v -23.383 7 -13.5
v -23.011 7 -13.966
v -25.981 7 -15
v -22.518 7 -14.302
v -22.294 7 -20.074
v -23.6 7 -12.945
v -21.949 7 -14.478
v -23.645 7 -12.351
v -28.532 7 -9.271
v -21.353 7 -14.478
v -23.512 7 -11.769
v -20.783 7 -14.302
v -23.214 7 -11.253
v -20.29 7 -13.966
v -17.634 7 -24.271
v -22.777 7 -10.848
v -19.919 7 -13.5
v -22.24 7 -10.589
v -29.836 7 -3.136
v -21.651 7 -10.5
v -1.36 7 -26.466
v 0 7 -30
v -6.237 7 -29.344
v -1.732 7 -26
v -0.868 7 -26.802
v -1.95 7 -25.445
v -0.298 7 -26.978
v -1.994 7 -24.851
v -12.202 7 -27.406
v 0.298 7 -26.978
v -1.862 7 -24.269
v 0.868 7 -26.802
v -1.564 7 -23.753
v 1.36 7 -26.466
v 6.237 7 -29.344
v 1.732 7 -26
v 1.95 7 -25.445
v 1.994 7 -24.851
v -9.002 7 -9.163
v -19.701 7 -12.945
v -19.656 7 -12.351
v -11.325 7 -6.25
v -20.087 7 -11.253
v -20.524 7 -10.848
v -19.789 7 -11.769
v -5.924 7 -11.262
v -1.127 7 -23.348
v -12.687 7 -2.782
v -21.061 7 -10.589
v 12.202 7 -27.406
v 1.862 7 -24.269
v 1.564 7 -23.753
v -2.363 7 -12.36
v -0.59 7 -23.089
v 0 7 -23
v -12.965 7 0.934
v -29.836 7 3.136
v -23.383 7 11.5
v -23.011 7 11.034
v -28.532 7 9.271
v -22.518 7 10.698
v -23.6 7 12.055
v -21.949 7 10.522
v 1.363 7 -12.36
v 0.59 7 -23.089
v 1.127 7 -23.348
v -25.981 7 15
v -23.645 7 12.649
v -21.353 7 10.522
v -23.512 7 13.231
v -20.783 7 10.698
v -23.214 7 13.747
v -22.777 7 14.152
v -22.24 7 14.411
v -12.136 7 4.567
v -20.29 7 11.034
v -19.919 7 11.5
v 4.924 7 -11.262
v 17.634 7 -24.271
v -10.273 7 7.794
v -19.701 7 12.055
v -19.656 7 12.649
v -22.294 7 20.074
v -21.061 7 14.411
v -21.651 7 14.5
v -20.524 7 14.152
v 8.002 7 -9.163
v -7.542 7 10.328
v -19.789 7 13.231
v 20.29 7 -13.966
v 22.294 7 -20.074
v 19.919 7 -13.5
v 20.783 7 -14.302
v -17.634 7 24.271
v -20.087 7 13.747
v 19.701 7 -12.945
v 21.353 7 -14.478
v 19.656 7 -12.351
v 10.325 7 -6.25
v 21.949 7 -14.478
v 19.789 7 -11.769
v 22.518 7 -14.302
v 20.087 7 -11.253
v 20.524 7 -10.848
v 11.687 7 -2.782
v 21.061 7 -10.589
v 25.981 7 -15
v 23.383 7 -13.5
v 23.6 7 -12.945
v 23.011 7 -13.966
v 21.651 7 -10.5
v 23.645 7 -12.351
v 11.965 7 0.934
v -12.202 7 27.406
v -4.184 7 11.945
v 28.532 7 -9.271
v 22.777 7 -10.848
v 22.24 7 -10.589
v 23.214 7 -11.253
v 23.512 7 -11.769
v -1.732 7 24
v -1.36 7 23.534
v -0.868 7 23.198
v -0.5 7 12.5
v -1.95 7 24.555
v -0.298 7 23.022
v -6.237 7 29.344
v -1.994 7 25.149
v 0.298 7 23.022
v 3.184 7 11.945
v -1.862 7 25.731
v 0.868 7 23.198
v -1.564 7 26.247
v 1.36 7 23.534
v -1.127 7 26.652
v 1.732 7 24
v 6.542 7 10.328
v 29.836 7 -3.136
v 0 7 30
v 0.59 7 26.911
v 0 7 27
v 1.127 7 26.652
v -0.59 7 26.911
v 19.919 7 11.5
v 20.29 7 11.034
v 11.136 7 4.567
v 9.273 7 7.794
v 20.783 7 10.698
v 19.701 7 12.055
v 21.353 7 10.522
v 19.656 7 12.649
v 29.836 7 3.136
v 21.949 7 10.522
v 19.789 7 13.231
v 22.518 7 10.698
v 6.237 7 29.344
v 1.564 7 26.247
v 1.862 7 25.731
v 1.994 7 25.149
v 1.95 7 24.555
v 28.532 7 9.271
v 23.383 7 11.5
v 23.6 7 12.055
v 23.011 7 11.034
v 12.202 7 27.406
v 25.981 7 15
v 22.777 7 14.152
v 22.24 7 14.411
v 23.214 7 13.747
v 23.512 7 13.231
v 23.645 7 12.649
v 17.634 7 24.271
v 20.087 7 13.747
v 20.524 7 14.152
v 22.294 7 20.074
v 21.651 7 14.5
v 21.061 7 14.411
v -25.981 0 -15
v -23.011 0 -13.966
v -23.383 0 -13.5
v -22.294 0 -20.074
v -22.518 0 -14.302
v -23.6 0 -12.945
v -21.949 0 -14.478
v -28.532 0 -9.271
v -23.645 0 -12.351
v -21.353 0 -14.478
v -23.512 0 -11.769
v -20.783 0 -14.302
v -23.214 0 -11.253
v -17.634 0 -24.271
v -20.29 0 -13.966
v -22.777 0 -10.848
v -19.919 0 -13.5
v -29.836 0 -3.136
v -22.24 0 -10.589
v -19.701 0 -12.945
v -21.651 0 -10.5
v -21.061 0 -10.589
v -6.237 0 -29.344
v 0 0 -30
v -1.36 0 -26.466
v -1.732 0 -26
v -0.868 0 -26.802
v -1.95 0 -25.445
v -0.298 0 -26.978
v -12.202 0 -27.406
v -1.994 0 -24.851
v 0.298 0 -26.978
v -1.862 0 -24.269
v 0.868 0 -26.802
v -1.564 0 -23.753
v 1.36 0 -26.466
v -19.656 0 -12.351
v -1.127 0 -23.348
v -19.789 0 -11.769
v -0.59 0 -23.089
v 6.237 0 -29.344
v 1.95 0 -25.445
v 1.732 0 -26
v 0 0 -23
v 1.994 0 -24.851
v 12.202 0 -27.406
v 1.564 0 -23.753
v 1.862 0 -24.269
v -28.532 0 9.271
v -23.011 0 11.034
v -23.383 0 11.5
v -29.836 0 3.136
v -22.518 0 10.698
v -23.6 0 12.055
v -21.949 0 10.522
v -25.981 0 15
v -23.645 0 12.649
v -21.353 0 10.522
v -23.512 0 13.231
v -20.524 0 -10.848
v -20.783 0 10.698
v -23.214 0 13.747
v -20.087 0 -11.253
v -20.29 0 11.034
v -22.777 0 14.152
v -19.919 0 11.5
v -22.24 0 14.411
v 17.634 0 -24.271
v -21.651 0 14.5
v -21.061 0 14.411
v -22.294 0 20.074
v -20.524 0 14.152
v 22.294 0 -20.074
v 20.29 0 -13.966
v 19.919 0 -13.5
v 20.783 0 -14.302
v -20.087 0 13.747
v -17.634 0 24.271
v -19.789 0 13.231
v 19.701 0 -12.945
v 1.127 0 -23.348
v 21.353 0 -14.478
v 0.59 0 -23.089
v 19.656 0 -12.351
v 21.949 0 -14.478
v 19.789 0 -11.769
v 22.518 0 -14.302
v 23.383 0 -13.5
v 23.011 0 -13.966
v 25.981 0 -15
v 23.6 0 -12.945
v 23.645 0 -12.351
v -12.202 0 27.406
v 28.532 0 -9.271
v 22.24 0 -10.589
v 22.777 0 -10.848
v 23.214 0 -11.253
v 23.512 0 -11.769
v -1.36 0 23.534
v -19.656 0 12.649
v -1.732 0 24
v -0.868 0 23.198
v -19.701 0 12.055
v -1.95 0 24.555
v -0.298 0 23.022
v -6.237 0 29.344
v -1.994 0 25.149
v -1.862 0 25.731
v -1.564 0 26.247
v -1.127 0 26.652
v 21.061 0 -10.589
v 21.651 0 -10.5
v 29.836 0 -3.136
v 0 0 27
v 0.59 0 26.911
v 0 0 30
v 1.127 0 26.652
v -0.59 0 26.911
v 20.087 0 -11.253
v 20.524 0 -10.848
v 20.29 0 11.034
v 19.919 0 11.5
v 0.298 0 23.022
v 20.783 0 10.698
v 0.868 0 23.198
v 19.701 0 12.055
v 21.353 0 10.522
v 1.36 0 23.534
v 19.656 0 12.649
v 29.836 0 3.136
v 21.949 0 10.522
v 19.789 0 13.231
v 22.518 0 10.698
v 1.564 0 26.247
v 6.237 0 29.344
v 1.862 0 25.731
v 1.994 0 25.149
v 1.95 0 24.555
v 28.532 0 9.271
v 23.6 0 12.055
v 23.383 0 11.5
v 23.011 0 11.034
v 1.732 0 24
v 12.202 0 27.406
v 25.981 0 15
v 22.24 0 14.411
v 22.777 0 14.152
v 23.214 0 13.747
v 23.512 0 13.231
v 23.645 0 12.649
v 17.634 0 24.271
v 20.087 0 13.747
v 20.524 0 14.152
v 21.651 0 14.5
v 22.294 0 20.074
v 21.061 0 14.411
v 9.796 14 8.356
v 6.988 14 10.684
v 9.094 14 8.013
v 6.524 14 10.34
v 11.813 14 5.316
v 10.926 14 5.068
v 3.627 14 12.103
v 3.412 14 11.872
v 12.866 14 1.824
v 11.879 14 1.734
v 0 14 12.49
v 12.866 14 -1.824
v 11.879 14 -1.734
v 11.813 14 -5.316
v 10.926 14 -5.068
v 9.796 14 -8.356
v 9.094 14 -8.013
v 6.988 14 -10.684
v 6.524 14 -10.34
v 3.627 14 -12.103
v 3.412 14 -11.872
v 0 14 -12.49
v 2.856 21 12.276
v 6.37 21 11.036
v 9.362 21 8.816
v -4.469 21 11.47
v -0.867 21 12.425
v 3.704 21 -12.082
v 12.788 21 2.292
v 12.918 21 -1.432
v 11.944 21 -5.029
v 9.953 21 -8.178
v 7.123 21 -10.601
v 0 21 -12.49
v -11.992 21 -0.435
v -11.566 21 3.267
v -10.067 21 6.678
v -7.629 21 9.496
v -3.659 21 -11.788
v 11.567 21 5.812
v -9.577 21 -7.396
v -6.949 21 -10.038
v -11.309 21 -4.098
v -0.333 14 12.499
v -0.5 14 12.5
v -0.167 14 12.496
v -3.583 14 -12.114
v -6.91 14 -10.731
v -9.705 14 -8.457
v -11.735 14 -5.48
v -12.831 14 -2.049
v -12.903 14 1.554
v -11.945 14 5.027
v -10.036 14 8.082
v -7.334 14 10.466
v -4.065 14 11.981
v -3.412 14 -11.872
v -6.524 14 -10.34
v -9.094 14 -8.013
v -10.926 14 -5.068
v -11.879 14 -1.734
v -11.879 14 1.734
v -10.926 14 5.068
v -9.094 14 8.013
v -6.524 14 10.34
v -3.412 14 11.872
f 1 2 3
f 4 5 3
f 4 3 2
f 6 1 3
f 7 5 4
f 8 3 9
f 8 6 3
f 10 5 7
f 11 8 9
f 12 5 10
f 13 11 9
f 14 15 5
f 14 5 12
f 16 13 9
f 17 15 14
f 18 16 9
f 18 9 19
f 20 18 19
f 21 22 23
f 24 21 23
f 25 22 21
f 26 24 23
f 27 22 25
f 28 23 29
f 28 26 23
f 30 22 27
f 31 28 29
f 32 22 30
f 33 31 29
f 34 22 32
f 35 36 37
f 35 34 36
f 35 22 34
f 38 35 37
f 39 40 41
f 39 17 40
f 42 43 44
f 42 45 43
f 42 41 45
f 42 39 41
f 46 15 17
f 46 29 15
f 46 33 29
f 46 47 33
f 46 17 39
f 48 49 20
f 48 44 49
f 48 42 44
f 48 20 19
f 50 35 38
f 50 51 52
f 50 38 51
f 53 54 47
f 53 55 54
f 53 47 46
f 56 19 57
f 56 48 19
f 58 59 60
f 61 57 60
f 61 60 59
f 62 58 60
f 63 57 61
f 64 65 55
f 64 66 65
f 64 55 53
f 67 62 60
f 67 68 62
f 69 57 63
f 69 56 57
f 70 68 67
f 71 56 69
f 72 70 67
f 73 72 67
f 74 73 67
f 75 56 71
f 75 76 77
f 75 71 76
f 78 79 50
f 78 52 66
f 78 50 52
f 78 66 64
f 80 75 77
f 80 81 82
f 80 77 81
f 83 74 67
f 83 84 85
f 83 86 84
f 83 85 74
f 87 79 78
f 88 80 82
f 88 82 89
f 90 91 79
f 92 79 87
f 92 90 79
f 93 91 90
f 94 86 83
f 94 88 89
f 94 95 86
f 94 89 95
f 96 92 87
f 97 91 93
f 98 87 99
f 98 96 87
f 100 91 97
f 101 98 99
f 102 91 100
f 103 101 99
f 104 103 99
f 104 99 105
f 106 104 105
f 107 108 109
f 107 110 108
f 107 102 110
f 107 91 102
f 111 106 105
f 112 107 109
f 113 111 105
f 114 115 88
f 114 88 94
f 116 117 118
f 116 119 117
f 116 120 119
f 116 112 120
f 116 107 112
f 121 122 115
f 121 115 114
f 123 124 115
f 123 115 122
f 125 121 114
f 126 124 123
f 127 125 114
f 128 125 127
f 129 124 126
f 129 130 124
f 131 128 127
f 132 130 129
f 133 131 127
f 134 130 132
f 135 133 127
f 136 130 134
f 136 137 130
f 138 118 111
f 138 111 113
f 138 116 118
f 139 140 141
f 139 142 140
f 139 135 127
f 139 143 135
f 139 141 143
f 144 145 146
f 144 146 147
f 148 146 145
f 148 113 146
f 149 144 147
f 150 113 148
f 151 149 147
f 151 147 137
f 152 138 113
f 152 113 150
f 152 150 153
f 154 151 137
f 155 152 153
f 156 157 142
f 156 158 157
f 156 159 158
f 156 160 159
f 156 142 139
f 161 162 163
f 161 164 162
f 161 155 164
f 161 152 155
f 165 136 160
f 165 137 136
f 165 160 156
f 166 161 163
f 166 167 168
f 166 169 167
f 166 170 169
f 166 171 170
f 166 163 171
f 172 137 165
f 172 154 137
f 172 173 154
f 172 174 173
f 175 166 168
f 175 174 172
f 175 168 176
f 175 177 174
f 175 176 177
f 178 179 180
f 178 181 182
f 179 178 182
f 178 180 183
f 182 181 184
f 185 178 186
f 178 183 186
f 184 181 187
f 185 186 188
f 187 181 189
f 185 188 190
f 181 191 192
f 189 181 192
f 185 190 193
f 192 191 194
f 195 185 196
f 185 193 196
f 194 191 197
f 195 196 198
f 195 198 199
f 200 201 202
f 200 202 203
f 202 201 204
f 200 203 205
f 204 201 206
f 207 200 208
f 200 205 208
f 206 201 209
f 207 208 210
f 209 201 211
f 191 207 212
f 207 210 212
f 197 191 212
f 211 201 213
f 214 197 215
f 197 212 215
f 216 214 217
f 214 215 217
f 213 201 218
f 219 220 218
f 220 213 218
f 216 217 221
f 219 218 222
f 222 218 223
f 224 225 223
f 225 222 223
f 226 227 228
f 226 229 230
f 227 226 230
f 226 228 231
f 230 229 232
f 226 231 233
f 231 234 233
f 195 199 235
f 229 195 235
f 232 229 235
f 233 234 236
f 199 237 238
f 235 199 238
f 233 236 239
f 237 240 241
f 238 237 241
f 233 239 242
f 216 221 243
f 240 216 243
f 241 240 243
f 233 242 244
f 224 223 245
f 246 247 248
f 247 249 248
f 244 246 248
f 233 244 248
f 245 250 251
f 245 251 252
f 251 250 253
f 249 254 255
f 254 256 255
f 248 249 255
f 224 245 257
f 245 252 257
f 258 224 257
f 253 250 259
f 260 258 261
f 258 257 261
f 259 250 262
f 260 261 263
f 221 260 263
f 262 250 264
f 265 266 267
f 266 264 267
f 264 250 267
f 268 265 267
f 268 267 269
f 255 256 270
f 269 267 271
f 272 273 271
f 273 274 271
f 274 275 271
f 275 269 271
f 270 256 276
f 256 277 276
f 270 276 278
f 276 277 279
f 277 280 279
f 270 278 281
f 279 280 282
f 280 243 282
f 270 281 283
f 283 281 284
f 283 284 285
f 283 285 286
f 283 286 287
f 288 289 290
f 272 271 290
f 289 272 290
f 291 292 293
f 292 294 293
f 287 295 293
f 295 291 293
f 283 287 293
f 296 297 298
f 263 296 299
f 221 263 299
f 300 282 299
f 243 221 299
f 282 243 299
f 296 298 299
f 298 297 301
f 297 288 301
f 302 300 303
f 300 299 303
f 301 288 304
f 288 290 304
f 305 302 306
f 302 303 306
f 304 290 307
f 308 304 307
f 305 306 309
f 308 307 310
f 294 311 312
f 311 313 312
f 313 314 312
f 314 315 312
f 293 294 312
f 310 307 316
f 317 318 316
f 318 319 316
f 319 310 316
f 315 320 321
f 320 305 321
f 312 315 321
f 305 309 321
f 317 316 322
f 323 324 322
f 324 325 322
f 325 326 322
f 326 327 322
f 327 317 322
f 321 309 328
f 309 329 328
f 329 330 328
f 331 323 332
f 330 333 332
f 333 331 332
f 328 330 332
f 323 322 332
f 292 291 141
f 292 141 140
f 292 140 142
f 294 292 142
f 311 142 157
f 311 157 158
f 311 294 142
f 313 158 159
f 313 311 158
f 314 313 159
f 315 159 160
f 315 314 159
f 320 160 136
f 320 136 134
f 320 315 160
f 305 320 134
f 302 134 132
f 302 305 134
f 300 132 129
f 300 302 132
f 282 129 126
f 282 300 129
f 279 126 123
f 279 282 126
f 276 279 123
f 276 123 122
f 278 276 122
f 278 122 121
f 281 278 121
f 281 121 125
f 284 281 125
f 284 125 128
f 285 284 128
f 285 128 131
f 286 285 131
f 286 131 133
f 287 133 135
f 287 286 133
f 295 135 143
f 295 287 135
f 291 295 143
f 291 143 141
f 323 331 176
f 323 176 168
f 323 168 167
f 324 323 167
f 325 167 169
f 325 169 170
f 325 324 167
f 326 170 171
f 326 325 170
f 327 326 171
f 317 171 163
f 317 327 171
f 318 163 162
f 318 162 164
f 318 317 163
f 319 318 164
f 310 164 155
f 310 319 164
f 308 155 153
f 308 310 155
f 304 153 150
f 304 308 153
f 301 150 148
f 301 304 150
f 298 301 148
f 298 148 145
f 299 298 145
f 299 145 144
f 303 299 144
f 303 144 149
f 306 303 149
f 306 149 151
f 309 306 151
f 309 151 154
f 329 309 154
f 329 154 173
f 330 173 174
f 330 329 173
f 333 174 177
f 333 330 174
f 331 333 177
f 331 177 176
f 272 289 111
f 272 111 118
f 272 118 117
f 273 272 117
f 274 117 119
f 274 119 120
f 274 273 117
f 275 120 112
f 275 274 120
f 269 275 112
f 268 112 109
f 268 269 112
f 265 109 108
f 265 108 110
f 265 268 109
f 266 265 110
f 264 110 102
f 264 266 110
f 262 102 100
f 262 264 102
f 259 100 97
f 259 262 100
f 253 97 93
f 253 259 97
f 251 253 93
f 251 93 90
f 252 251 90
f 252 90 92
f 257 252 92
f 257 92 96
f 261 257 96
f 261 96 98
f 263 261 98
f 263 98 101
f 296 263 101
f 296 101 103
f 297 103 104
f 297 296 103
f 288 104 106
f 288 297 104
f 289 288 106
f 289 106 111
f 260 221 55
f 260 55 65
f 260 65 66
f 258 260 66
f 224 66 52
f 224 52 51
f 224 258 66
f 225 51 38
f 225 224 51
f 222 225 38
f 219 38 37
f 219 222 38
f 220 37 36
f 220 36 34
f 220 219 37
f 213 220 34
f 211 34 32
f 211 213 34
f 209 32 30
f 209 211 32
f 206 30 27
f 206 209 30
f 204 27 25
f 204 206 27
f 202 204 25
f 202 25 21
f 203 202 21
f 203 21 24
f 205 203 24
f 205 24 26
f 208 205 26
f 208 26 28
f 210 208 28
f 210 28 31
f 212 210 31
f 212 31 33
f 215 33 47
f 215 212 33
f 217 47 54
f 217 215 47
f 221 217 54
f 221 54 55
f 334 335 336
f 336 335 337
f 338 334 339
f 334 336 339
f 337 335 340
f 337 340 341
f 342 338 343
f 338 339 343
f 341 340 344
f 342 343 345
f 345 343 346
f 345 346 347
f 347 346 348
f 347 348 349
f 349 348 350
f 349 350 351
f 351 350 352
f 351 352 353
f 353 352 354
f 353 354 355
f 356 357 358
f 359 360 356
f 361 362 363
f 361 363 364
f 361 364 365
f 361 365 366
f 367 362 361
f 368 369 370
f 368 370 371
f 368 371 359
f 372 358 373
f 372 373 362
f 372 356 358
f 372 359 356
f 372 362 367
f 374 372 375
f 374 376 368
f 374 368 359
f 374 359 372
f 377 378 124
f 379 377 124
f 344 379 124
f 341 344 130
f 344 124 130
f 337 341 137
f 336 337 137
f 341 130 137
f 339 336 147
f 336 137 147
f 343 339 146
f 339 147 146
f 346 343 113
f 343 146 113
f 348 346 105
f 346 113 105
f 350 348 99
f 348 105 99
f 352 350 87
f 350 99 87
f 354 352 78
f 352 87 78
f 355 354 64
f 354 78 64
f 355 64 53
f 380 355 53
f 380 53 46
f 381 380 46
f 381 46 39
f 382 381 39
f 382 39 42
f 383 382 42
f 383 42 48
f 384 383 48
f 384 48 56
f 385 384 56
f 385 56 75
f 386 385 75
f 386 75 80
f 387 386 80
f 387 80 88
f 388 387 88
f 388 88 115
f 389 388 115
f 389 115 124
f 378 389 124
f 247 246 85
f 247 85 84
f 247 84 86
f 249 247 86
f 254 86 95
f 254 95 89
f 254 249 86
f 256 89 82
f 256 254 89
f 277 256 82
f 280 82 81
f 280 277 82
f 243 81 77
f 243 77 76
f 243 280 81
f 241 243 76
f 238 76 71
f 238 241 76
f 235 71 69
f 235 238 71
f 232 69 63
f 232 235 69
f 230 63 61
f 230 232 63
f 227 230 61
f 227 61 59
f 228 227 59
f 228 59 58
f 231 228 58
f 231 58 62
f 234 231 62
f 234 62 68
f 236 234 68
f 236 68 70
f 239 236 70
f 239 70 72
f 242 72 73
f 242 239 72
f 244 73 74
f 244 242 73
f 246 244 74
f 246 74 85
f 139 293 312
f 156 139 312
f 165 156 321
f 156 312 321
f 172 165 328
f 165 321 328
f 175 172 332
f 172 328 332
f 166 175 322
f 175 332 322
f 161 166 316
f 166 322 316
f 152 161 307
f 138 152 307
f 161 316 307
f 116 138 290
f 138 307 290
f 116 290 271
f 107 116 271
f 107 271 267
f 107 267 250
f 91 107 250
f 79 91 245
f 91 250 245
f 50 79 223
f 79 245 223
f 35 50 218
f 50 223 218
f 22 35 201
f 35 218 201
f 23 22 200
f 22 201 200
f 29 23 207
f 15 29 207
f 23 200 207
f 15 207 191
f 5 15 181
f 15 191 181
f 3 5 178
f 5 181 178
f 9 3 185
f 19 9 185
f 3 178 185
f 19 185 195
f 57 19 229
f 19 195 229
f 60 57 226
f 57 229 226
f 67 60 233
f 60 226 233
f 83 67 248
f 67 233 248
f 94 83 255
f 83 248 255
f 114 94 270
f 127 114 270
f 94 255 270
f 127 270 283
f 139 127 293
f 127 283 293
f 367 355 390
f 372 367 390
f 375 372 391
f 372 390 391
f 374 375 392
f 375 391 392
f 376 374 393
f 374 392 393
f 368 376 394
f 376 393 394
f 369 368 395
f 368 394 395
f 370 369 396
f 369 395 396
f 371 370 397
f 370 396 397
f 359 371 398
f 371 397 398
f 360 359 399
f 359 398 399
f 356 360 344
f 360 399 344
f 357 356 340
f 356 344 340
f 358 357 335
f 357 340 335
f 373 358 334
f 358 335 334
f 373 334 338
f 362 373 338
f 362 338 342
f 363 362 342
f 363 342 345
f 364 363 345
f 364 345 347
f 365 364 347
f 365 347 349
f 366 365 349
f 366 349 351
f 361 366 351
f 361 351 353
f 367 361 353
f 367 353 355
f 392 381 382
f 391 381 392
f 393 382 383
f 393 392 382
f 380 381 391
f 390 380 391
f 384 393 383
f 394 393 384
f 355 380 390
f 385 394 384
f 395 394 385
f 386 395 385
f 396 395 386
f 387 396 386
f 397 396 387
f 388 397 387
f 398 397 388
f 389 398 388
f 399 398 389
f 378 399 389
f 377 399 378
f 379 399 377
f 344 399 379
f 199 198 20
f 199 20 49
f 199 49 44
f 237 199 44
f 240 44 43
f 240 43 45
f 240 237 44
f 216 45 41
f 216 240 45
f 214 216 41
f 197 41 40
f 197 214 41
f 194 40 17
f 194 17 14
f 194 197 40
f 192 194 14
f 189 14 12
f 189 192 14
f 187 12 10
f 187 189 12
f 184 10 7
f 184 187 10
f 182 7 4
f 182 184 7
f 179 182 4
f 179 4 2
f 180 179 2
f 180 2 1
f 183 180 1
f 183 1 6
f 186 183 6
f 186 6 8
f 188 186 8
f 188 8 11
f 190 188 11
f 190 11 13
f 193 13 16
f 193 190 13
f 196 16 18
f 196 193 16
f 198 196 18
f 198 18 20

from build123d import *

# Parameters (mm, degrees)
SKETCH1_R           = 30
SKETCH1_R_2         = 2
BOSS_EXTRUDE1_DEPTH = 7
SKETCH2_R           = 12.5
BOSS_EXTRUDE2_DEPTH = 7
SKETCH3_R           = 12.5
BOSS_EXTRUDE3_DEPTH = 7


with BuildPart() as part:
    # Sketch1 → Boss-Extrude1 (new body)
    with BuildSketch(Plane(origin=(0, 0, 0), x_dir=(1, 0, 0), z_dir=(0, 1, 0))):
        with Locations(Location((0, 0, 0), (0, 0, 270))):
            Circle(SKETCH1_R)
        with Locations(Location((0, 25, 0), (0, 0, 270))):
            Circle(SKETCH1_R_2, mode=Mode.SUBTRACT)
        with Locations(Location((21.650635095, 12.5, 0), (0, 0, 270))):
            Circle(SKETCH1_R_2, mode=Mode.SUBTRACT)
        with Locations(Location((21.650635095, -12.5, 0), (0, 0, 270))):
            Circle(SKETCH1_R_2, mode=Mode.SUBTRACT)
        with Locations(Location((0, -25, 0), (0, 0, 270))):
            Circle(SKETCH1_R_2, mode=Mode.SUBTRACT)
        with Locations(Location((-21.650635095, -12.5, 0), (0, 0, 270))):
            Circle(SKETCH1_R_2, mode=Mode.SUBTRACT)
        with Locations(Location((-21.650635095, 12.5, 0), (0, 0, 270))):
            Circle(SKETCH1_R_2, mode=Mode.SUBTRACT)
    extrude(amount=BOSS_EXTRUDE1_DEPTH)

    # Sketch2 → Boss-Extrude2 (add)
    with BuildSketch(Plane(origin=(0, 7, 0), x_dir=(1, 0, 0), z_dir=(0, 1, 0))):
        with Locations(Location((-0.5, 0, 0), (0, 0, 270))):
            Circle(SKETCH2_R)
    extrude(amount=BOSS_EXTRUDE2_DEPTH)

    # Sketch3 → Boss-Extrude3 (add)
    with BuildSketch(Plane(origin=(0, 14, 0), x_dir=(1, 0, 0), z_dir=(0, 1, 0))):
        with Locations(Location((0.5, 0, 0), (0, 0, 92.292442776))):
            Circle(SKETCH3_R)
    extrude(amount=BOSS_EXTRUDE3_DEPTH)


solid = part.part
